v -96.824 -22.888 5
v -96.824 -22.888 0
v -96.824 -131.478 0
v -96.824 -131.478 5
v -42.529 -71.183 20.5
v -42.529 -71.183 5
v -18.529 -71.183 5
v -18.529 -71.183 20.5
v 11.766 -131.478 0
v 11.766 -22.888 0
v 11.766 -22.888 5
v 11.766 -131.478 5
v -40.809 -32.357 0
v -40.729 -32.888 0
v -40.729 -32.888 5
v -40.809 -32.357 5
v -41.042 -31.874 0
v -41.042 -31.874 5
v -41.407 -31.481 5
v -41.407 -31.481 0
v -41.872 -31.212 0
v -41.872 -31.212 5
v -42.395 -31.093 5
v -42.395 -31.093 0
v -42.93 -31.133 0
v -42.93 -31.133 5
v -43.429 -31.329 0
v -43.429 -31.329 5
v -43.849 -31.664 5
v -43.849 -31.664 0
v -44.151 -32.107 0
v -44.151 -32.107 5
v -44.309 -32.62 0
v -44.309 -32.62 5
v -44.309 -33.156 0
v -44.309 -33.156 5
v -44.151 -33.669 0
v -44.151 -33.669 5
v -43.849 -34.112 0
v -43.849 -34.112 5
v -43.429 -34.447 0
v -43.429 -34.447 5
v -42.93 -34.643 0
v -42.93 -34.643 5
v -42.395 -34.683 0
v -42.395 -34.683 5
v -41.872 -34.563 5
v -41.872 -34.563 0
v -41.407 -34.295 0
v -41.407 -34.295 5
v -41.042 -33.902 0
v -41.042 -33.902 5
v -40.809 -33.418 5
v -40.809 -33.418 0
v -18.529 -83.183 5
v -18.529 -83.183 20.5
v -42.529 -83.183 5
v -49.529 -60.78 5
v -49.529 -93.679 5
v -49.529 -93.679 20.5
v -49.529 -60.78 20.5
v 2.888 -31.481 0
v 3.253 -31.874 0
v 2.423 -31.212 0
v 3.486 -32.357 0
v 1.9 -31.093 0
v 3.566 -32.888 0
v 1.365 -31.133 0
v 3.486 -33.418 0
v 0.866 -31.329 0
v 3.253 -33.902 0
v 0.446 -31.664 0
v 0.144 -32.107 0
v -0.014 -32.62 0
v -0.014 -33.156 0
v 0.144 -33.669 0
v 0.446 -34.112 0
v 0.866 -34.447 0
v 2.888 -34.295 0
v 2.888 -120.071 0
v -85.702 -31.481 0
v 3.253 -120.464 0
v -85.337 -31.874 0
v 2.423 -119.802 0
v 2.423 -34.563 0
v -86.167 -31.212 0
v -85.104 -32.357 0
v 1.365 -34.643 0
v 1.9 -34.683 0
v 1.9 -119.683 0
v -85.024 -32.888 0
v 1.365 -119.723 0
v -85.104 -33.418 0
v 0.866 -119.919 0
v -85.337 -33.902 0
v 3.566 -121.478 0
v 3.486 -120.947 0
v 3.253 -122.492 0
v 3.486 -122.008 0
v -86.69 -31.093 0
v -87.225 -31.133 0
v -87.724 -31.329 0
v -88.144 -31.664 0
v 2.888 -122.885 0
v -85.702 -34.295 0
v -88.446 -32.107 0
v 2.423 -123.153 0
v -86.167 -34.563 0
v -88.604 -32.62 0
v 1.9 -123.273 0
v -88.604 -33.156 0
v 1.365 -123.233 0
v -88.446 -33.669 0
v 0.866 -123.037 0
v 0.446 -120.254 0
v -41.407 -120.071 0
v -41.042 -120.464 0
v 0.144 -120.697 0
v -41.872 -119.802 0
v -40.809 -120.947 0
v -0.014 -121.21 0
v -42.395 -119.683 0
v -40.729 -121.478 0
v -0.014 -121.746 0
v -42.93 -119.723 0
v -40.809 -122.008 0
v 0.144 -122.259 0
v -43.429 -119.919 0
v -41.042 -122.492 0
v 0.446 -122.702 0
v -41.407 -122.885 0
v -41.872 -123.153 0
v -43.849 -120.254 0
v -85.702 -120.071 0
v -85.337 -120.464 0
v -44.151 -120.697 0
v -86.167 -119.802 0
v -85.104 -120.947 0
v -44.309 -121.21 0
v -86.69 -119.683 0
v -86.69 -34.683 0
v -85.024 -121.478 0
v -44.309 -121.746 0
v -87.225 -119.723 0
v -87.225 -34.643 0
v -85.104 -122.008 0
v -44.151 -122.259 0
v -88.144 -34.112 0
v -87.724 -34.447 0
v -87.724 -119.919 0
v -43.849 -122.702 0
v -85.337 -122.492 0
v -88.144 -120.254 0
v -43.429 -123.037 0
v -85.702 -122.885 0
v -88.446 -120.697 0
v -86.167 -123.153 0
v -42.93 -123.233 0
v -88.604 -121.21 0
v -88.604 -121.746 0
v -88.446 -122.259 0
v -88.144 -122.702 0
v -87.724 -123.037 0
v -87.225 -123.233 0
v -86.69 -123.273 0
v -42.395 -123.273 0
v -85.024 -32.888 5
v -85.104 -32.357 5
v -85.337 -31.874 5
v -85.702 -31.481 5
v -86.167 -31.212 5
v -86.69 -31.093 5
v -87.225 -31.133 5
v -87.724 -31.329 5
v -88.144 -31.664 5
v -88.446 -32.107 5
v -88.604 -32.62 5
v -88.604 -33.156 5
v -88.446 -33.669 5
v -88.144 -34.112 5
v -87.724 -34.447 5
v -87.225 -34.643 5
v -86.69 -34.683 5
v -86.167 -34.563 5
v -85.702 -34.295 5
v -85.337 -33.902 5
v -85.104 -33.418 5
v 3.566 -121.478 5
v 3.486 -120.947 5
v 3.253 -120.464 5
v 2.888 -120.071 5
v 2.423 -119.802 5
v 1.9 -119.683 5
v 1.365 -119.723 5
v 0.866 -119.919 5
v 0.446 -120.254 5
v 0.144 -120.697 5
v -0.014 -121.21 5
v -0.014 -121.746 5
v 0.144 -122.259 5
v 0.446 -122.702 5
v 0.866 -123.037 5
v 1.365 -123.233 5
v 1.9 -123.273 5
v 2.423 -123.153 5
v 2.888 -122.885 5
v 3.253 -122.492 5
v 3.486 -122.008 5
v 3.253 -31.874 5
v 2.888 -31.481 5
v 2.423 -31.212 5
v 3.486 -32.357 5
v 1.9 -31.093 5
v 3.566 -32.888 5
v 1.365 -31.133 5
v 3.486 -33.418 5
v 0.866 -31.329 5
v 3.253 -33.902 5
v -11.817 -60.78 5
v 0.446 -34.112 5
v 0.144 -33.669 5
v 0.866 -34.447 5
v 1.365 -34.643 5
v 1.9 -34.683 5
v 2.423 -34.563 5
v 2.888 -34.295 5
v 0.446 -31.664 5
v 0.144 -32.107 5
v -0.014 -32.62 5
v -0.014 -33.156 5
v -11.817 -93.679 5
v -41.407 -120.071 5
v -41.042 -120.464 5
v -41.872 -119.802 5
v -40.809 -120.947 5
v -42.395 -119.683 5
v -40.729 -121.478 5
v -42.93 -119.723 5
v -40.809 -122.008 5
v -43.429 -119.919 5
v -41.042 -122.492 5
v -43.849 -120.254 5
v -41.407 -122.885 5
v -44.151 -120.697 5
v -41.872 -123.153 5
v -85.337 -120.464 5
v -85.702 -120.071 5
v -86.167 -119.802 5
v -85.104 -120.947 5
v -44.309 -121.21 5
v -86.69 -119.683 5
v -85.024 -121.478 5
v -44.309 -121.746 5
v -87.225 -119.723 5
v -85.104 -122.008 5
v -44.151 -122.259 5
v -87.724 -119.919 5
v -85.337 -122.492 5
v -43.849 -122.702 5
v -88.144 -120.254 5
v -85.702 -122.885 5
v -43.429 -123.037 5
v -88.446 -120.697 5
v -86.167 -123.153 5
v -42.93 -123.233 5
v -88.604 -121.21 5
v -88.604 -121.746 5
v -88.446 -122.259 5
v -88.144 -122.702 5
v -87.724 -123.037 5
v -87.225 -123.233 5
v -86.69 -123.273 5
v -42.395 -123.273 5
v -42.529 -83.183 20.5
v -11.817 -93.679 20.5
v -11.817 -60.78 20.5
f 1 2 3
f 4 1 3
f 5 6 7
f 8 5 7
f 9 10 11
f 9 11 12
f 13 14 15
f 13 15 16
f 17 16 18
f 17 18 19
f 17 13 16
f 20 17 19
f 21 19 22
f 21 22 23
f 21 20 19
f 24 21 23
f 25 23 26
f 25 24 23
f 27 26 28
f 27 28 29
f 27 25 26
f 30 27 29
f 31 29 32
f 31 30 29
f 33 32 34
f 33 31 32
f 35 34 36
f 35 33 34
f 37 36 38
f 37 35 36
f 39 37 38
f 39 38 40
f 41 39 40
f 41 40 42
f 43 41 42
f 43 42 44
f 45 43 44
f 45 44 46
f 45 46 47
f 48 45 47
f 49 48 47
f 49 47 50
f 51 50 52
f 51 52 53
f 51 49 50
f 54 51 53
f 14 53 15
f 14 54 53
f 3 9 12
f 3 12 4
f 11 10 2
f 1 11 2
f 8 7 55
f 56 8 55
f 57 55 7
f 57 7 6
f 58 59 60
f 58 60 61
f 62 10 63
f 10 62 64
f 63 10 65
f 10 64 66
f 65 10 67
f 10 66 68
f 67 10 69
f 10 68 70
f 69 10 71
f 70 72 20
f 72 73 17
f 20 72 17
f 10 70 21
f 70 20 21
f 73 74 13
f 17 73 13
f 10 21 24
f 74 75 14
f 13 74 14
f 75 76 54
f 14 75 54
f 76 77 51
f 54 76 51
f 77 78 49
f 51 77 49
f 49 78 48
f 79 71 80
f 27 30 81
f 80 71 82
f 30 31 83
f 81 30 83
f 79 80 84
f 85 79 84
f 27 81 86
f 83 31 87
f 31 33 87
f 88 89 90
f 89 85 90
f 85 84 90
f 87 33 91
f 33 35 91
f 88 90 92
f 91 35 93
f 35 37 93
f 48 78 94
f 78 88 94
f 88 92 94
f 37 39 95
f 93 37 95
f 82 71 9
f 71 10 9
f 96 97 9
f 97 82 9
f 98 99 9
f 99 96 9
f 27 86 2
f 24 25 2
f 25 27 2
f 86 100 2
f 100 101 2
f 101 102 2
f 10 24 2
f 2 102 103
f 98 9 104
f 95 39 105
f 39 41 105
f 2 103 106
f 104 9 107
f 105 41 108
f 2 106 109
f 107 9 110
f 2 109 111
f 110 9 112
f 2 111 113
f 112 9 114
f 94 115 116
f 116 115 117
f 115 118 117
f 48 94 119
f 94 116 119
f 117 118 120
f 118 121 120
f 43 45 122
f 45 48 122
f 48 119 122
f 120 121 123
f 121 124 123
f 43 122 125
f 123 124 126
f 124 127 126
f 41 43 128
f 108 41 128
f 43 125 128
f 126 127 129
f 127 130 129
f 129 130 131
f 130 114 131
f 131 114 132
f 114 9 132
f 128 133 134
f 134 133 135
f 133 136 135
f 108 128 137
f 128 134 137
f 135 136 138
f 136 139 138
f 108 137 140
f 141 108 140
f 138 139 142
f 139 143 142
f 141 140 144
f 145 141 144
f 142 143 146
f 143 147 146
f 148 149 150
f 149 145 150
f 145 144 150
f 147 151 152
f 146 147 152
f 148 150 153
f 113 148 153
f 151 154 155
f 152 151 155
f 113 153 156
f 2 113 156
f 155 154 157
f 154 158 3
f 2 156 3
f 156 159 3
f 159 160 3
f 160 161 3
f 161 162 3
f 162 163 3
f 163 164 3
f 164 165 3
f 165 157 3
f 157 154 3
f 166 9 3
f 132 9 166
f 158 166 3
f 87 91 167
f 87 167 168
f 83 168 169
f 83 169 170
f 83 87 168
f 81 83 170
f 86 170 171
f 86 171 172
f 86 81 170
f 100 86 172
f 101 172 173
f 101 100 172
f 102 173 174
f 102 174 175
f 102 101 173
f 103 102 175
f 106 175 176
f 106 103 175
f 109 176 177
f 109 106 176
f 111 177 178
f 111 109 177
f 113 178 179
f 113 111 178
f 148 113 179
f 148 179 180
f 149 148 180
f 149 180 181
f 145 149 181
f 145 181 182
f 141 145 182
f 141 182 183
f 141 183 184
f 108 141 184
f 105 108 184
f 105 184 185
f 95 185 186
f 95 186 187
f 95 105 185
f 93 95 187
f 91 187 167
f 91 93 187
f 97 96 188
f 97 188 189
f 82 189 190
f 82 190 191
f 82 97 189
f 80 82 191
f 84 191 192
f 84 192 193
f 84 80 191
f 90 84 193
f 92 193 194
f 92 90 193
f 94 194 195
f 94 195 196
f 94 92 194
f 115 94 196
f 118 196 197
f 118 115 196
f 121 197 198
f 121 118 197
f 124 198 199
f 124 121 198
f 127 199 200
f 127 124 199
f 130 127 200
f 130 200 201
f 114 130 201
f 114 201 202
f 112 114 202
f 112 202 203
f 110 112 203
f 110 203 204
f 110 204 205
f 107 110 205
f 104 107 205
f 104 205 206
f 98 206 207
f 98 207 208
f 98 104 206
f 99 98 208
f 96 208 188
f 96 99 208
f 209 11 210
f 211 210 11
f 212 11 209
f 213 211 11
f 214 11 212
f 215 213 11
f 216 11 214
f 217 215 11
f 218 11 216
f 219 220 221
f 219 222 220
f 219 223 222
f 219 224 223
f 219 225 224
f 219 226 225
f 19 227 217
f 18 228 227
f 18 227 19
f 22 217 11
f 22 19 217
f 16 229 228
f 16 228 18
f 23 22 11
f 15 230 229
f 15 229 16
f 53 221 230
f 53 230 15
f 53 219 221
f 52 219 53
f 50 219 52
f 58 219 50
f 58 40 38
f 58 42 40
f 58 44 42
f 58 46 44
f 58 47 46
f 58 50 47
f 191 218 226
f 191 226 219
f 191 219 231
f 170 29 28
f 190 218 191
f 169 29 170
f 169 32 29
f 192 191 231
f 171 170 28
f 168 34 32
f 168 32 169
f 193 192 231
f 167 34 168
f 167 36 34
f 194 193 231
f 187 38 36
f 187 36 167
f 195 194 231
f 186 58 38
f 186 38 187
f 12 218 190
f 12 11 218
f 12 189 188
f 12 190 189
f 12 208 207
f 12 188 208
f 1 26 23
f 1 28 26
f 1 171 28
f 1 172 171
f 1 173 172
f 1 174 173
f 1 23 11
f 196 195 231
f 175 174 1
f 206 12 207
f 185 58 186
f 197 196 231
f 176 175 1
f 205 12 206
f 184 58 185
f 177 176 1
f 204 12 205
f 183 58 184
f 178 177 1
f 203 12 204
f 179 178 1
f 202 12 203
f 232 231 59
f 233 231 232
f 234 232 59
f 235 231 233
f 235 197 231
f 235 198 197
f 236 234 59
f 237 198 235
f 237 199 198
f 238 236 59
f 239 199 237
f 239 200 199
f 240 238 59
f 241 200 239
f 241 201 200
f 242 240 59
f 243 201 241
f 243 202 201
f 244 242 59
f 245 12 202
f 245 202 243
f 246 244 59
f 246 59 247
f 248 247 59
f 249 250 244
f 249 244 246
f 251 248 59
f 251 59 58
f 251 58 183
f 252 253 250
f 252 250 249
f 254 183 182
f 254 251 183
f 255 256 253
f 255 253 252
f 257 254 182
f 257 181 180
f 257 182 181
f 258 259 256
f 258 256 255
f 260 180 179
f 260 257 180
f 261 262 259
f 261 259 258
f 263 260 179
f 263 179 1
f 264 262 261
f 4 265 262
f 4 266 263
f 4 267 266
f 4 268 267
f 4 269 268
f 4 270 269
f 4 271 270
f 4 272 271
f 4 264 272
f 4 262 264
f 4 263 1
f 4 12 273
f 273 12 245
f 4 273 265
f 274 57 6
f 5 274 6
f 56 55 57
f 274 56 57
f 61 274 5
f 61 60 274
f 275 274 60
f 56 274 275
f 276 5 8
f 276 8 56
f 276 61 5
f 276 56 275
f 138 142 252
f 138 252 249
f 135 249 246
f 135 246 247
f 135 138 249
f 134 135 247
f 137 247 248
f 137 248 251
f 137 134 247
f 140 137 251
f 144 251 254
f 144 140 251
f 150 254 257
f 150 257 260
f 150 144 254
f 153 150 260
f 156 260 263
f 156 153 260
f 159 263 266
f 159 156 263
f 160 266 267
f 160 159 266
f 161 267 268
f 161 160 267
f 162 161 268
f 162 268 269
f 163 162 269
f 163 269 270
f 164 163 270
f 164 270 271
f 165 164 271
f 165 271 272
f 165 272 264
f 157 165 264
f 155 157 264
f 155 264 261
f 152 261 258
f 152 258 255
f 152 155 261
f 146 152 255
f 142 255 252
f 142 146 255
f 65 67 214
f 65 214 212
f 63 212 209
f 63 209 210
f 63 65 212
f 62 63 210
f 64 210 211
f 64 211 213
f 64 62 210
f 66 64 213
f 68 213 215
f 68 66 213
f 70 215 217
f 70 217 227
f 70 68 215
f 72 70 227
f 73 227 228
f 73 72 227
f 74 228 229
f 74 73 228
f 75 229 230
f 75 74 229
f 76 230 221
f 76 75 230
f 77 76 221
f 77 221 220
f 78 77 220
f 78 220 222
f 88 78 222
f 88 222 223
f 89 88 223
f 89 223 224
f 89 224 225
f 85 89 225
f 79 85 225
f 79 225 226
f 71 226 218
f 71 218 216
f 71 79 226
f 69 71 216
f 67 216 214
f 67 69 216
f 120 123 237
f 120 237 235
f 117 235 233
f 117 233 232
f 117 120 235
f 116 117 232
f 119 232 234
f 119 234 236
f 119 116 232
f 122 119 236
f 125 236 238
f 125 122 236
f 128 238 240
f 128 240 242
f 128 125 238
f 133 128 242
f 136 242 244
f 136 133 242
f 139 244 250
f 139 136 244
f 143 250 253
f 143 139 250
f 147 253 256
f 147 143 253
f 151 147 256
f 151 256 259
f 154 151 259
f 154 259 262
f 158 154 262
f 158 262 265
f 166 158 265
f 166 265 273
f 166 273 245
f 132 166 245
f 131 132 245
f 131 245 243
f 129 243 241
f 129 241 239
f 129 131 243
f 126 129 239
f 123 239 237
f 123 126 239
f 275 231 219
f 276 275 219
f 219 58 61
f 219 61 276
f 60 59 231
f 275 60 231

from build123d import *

# Parameters (mm, degrees)
ESQUISSE1_R        = 1.8
BOSS_EXTRU_1_DEPTH = 5
ESQUISSE7_W        = 37.712200448
ESQUISSE7_H        = 32.898703175
BOSS_EXTRU_2_DEPTH = 15.5


with BuildPart() as part:
    # Esquisse1 → Boss.-Extru.1 (new body)
    with BuildSketch(Plane(origin=(0, 0, 0), x_dir=(-1, 0, 0), z_dir=(0, 0, 1))):
        Polygon((96.824454852, 121.477817805), (96.824454852, 131.477817805), (-1.765545148, 131.477817805), (-11.765545148, 131.477817805), (-11.765545148, 22.887817805), (-1.765545148, 22.887817805), (42.529454852, 22.887817805), (86.824454852, 22.887817805), (96.824454852, 22.887817805), align=None)
        with BuildLine():
            ThreePointArc((0.034454852, 32.887817805), (-0.492752942, 31.615025599), (-1.765545148, 31.087817805))
            ThreePointArc((-1.765545148, 31.087817805), (-3.038337355, 34.160610011), (0.034454852, 32.887817805))
        make_face(mode=Mode.SUBTRACT)
        with BuildLine():
            ThreePointArc((44.329454852, 32.887817805), (43.802247058, 31.615025599), (42.529454852, 31.087817805))
            ThreePointArc((42.529454852, 31.087817805), (40.729454852, 32.887817805), (42.529454852, 34.687817805))
            ThreePointArc((42.529454852, 34.687817805), (43.802247058, 34.160610011), (44.329454852, 32.887817805))
        make_face(mode=Mode.SUBTRACT)
        with BuildLine():
            ThreePointArc((88.624454852, 32.887817805), (88.097247058, 31.615025599), (86.824454852, 31.087817805))
            ThreePointArc((86.824454852, 31.087817805), (85.551662645, 34.160610011), (88.624454852, 32.887817805))
        make_face(mode=Mode.SUBTRACT)
        with BuildLine():
            ThreePointArc((0.034454852, 121.477817805), (-3.038337355, 120.205025599), (-1.765545148, 123.277817805))
            ThreePointArc((-1.765545148, 123.277817805), (-0.492752942, 122.750610011), (0.034454852, 121.477817805))
        make_face(mode=Mode.SUBTRACT)
        with BuildLine():
            ThreePointArc((44.329454852, 121.477817805), (43.802247058, 120.205025599), (42.529454852, 119.677817805))
            ThreePointArc((42.529454852, 119.677817805), (41.256662645, 122.750610011), (44.329454852, 121.477817805))
        make_face(mode=Mode.SUBTRACT)
        with Locations((86.824454852, 121.477817805)):
            Circle(ESQUISSE1_R, mode=Mode.SUBTRACT)
    extrude(amount=BOSS_EXTRU_1_DEPTH)

    # Esquisse7 → Boss.-Extru.2 (add)
    with BuildSketch(Plane.XY.offset(5)):
        with Locations((-30.673354628, -77.229731143)):
            Rectangle(ESQUISSE7_W, ESQUISSE7_H)
        Polygon((-42.529454852, -77.182817805), (-42.529454852, -71.182817805), (-18.529454852, -71.182817805), (-18.529454852, -83.182817805), (-42.529454852, -83.182817805), align=None, mode=Mode.SUBTRACT)
    extrude(amount=BOSS_EXTRU_2_DEPTH)


solid = part.part
